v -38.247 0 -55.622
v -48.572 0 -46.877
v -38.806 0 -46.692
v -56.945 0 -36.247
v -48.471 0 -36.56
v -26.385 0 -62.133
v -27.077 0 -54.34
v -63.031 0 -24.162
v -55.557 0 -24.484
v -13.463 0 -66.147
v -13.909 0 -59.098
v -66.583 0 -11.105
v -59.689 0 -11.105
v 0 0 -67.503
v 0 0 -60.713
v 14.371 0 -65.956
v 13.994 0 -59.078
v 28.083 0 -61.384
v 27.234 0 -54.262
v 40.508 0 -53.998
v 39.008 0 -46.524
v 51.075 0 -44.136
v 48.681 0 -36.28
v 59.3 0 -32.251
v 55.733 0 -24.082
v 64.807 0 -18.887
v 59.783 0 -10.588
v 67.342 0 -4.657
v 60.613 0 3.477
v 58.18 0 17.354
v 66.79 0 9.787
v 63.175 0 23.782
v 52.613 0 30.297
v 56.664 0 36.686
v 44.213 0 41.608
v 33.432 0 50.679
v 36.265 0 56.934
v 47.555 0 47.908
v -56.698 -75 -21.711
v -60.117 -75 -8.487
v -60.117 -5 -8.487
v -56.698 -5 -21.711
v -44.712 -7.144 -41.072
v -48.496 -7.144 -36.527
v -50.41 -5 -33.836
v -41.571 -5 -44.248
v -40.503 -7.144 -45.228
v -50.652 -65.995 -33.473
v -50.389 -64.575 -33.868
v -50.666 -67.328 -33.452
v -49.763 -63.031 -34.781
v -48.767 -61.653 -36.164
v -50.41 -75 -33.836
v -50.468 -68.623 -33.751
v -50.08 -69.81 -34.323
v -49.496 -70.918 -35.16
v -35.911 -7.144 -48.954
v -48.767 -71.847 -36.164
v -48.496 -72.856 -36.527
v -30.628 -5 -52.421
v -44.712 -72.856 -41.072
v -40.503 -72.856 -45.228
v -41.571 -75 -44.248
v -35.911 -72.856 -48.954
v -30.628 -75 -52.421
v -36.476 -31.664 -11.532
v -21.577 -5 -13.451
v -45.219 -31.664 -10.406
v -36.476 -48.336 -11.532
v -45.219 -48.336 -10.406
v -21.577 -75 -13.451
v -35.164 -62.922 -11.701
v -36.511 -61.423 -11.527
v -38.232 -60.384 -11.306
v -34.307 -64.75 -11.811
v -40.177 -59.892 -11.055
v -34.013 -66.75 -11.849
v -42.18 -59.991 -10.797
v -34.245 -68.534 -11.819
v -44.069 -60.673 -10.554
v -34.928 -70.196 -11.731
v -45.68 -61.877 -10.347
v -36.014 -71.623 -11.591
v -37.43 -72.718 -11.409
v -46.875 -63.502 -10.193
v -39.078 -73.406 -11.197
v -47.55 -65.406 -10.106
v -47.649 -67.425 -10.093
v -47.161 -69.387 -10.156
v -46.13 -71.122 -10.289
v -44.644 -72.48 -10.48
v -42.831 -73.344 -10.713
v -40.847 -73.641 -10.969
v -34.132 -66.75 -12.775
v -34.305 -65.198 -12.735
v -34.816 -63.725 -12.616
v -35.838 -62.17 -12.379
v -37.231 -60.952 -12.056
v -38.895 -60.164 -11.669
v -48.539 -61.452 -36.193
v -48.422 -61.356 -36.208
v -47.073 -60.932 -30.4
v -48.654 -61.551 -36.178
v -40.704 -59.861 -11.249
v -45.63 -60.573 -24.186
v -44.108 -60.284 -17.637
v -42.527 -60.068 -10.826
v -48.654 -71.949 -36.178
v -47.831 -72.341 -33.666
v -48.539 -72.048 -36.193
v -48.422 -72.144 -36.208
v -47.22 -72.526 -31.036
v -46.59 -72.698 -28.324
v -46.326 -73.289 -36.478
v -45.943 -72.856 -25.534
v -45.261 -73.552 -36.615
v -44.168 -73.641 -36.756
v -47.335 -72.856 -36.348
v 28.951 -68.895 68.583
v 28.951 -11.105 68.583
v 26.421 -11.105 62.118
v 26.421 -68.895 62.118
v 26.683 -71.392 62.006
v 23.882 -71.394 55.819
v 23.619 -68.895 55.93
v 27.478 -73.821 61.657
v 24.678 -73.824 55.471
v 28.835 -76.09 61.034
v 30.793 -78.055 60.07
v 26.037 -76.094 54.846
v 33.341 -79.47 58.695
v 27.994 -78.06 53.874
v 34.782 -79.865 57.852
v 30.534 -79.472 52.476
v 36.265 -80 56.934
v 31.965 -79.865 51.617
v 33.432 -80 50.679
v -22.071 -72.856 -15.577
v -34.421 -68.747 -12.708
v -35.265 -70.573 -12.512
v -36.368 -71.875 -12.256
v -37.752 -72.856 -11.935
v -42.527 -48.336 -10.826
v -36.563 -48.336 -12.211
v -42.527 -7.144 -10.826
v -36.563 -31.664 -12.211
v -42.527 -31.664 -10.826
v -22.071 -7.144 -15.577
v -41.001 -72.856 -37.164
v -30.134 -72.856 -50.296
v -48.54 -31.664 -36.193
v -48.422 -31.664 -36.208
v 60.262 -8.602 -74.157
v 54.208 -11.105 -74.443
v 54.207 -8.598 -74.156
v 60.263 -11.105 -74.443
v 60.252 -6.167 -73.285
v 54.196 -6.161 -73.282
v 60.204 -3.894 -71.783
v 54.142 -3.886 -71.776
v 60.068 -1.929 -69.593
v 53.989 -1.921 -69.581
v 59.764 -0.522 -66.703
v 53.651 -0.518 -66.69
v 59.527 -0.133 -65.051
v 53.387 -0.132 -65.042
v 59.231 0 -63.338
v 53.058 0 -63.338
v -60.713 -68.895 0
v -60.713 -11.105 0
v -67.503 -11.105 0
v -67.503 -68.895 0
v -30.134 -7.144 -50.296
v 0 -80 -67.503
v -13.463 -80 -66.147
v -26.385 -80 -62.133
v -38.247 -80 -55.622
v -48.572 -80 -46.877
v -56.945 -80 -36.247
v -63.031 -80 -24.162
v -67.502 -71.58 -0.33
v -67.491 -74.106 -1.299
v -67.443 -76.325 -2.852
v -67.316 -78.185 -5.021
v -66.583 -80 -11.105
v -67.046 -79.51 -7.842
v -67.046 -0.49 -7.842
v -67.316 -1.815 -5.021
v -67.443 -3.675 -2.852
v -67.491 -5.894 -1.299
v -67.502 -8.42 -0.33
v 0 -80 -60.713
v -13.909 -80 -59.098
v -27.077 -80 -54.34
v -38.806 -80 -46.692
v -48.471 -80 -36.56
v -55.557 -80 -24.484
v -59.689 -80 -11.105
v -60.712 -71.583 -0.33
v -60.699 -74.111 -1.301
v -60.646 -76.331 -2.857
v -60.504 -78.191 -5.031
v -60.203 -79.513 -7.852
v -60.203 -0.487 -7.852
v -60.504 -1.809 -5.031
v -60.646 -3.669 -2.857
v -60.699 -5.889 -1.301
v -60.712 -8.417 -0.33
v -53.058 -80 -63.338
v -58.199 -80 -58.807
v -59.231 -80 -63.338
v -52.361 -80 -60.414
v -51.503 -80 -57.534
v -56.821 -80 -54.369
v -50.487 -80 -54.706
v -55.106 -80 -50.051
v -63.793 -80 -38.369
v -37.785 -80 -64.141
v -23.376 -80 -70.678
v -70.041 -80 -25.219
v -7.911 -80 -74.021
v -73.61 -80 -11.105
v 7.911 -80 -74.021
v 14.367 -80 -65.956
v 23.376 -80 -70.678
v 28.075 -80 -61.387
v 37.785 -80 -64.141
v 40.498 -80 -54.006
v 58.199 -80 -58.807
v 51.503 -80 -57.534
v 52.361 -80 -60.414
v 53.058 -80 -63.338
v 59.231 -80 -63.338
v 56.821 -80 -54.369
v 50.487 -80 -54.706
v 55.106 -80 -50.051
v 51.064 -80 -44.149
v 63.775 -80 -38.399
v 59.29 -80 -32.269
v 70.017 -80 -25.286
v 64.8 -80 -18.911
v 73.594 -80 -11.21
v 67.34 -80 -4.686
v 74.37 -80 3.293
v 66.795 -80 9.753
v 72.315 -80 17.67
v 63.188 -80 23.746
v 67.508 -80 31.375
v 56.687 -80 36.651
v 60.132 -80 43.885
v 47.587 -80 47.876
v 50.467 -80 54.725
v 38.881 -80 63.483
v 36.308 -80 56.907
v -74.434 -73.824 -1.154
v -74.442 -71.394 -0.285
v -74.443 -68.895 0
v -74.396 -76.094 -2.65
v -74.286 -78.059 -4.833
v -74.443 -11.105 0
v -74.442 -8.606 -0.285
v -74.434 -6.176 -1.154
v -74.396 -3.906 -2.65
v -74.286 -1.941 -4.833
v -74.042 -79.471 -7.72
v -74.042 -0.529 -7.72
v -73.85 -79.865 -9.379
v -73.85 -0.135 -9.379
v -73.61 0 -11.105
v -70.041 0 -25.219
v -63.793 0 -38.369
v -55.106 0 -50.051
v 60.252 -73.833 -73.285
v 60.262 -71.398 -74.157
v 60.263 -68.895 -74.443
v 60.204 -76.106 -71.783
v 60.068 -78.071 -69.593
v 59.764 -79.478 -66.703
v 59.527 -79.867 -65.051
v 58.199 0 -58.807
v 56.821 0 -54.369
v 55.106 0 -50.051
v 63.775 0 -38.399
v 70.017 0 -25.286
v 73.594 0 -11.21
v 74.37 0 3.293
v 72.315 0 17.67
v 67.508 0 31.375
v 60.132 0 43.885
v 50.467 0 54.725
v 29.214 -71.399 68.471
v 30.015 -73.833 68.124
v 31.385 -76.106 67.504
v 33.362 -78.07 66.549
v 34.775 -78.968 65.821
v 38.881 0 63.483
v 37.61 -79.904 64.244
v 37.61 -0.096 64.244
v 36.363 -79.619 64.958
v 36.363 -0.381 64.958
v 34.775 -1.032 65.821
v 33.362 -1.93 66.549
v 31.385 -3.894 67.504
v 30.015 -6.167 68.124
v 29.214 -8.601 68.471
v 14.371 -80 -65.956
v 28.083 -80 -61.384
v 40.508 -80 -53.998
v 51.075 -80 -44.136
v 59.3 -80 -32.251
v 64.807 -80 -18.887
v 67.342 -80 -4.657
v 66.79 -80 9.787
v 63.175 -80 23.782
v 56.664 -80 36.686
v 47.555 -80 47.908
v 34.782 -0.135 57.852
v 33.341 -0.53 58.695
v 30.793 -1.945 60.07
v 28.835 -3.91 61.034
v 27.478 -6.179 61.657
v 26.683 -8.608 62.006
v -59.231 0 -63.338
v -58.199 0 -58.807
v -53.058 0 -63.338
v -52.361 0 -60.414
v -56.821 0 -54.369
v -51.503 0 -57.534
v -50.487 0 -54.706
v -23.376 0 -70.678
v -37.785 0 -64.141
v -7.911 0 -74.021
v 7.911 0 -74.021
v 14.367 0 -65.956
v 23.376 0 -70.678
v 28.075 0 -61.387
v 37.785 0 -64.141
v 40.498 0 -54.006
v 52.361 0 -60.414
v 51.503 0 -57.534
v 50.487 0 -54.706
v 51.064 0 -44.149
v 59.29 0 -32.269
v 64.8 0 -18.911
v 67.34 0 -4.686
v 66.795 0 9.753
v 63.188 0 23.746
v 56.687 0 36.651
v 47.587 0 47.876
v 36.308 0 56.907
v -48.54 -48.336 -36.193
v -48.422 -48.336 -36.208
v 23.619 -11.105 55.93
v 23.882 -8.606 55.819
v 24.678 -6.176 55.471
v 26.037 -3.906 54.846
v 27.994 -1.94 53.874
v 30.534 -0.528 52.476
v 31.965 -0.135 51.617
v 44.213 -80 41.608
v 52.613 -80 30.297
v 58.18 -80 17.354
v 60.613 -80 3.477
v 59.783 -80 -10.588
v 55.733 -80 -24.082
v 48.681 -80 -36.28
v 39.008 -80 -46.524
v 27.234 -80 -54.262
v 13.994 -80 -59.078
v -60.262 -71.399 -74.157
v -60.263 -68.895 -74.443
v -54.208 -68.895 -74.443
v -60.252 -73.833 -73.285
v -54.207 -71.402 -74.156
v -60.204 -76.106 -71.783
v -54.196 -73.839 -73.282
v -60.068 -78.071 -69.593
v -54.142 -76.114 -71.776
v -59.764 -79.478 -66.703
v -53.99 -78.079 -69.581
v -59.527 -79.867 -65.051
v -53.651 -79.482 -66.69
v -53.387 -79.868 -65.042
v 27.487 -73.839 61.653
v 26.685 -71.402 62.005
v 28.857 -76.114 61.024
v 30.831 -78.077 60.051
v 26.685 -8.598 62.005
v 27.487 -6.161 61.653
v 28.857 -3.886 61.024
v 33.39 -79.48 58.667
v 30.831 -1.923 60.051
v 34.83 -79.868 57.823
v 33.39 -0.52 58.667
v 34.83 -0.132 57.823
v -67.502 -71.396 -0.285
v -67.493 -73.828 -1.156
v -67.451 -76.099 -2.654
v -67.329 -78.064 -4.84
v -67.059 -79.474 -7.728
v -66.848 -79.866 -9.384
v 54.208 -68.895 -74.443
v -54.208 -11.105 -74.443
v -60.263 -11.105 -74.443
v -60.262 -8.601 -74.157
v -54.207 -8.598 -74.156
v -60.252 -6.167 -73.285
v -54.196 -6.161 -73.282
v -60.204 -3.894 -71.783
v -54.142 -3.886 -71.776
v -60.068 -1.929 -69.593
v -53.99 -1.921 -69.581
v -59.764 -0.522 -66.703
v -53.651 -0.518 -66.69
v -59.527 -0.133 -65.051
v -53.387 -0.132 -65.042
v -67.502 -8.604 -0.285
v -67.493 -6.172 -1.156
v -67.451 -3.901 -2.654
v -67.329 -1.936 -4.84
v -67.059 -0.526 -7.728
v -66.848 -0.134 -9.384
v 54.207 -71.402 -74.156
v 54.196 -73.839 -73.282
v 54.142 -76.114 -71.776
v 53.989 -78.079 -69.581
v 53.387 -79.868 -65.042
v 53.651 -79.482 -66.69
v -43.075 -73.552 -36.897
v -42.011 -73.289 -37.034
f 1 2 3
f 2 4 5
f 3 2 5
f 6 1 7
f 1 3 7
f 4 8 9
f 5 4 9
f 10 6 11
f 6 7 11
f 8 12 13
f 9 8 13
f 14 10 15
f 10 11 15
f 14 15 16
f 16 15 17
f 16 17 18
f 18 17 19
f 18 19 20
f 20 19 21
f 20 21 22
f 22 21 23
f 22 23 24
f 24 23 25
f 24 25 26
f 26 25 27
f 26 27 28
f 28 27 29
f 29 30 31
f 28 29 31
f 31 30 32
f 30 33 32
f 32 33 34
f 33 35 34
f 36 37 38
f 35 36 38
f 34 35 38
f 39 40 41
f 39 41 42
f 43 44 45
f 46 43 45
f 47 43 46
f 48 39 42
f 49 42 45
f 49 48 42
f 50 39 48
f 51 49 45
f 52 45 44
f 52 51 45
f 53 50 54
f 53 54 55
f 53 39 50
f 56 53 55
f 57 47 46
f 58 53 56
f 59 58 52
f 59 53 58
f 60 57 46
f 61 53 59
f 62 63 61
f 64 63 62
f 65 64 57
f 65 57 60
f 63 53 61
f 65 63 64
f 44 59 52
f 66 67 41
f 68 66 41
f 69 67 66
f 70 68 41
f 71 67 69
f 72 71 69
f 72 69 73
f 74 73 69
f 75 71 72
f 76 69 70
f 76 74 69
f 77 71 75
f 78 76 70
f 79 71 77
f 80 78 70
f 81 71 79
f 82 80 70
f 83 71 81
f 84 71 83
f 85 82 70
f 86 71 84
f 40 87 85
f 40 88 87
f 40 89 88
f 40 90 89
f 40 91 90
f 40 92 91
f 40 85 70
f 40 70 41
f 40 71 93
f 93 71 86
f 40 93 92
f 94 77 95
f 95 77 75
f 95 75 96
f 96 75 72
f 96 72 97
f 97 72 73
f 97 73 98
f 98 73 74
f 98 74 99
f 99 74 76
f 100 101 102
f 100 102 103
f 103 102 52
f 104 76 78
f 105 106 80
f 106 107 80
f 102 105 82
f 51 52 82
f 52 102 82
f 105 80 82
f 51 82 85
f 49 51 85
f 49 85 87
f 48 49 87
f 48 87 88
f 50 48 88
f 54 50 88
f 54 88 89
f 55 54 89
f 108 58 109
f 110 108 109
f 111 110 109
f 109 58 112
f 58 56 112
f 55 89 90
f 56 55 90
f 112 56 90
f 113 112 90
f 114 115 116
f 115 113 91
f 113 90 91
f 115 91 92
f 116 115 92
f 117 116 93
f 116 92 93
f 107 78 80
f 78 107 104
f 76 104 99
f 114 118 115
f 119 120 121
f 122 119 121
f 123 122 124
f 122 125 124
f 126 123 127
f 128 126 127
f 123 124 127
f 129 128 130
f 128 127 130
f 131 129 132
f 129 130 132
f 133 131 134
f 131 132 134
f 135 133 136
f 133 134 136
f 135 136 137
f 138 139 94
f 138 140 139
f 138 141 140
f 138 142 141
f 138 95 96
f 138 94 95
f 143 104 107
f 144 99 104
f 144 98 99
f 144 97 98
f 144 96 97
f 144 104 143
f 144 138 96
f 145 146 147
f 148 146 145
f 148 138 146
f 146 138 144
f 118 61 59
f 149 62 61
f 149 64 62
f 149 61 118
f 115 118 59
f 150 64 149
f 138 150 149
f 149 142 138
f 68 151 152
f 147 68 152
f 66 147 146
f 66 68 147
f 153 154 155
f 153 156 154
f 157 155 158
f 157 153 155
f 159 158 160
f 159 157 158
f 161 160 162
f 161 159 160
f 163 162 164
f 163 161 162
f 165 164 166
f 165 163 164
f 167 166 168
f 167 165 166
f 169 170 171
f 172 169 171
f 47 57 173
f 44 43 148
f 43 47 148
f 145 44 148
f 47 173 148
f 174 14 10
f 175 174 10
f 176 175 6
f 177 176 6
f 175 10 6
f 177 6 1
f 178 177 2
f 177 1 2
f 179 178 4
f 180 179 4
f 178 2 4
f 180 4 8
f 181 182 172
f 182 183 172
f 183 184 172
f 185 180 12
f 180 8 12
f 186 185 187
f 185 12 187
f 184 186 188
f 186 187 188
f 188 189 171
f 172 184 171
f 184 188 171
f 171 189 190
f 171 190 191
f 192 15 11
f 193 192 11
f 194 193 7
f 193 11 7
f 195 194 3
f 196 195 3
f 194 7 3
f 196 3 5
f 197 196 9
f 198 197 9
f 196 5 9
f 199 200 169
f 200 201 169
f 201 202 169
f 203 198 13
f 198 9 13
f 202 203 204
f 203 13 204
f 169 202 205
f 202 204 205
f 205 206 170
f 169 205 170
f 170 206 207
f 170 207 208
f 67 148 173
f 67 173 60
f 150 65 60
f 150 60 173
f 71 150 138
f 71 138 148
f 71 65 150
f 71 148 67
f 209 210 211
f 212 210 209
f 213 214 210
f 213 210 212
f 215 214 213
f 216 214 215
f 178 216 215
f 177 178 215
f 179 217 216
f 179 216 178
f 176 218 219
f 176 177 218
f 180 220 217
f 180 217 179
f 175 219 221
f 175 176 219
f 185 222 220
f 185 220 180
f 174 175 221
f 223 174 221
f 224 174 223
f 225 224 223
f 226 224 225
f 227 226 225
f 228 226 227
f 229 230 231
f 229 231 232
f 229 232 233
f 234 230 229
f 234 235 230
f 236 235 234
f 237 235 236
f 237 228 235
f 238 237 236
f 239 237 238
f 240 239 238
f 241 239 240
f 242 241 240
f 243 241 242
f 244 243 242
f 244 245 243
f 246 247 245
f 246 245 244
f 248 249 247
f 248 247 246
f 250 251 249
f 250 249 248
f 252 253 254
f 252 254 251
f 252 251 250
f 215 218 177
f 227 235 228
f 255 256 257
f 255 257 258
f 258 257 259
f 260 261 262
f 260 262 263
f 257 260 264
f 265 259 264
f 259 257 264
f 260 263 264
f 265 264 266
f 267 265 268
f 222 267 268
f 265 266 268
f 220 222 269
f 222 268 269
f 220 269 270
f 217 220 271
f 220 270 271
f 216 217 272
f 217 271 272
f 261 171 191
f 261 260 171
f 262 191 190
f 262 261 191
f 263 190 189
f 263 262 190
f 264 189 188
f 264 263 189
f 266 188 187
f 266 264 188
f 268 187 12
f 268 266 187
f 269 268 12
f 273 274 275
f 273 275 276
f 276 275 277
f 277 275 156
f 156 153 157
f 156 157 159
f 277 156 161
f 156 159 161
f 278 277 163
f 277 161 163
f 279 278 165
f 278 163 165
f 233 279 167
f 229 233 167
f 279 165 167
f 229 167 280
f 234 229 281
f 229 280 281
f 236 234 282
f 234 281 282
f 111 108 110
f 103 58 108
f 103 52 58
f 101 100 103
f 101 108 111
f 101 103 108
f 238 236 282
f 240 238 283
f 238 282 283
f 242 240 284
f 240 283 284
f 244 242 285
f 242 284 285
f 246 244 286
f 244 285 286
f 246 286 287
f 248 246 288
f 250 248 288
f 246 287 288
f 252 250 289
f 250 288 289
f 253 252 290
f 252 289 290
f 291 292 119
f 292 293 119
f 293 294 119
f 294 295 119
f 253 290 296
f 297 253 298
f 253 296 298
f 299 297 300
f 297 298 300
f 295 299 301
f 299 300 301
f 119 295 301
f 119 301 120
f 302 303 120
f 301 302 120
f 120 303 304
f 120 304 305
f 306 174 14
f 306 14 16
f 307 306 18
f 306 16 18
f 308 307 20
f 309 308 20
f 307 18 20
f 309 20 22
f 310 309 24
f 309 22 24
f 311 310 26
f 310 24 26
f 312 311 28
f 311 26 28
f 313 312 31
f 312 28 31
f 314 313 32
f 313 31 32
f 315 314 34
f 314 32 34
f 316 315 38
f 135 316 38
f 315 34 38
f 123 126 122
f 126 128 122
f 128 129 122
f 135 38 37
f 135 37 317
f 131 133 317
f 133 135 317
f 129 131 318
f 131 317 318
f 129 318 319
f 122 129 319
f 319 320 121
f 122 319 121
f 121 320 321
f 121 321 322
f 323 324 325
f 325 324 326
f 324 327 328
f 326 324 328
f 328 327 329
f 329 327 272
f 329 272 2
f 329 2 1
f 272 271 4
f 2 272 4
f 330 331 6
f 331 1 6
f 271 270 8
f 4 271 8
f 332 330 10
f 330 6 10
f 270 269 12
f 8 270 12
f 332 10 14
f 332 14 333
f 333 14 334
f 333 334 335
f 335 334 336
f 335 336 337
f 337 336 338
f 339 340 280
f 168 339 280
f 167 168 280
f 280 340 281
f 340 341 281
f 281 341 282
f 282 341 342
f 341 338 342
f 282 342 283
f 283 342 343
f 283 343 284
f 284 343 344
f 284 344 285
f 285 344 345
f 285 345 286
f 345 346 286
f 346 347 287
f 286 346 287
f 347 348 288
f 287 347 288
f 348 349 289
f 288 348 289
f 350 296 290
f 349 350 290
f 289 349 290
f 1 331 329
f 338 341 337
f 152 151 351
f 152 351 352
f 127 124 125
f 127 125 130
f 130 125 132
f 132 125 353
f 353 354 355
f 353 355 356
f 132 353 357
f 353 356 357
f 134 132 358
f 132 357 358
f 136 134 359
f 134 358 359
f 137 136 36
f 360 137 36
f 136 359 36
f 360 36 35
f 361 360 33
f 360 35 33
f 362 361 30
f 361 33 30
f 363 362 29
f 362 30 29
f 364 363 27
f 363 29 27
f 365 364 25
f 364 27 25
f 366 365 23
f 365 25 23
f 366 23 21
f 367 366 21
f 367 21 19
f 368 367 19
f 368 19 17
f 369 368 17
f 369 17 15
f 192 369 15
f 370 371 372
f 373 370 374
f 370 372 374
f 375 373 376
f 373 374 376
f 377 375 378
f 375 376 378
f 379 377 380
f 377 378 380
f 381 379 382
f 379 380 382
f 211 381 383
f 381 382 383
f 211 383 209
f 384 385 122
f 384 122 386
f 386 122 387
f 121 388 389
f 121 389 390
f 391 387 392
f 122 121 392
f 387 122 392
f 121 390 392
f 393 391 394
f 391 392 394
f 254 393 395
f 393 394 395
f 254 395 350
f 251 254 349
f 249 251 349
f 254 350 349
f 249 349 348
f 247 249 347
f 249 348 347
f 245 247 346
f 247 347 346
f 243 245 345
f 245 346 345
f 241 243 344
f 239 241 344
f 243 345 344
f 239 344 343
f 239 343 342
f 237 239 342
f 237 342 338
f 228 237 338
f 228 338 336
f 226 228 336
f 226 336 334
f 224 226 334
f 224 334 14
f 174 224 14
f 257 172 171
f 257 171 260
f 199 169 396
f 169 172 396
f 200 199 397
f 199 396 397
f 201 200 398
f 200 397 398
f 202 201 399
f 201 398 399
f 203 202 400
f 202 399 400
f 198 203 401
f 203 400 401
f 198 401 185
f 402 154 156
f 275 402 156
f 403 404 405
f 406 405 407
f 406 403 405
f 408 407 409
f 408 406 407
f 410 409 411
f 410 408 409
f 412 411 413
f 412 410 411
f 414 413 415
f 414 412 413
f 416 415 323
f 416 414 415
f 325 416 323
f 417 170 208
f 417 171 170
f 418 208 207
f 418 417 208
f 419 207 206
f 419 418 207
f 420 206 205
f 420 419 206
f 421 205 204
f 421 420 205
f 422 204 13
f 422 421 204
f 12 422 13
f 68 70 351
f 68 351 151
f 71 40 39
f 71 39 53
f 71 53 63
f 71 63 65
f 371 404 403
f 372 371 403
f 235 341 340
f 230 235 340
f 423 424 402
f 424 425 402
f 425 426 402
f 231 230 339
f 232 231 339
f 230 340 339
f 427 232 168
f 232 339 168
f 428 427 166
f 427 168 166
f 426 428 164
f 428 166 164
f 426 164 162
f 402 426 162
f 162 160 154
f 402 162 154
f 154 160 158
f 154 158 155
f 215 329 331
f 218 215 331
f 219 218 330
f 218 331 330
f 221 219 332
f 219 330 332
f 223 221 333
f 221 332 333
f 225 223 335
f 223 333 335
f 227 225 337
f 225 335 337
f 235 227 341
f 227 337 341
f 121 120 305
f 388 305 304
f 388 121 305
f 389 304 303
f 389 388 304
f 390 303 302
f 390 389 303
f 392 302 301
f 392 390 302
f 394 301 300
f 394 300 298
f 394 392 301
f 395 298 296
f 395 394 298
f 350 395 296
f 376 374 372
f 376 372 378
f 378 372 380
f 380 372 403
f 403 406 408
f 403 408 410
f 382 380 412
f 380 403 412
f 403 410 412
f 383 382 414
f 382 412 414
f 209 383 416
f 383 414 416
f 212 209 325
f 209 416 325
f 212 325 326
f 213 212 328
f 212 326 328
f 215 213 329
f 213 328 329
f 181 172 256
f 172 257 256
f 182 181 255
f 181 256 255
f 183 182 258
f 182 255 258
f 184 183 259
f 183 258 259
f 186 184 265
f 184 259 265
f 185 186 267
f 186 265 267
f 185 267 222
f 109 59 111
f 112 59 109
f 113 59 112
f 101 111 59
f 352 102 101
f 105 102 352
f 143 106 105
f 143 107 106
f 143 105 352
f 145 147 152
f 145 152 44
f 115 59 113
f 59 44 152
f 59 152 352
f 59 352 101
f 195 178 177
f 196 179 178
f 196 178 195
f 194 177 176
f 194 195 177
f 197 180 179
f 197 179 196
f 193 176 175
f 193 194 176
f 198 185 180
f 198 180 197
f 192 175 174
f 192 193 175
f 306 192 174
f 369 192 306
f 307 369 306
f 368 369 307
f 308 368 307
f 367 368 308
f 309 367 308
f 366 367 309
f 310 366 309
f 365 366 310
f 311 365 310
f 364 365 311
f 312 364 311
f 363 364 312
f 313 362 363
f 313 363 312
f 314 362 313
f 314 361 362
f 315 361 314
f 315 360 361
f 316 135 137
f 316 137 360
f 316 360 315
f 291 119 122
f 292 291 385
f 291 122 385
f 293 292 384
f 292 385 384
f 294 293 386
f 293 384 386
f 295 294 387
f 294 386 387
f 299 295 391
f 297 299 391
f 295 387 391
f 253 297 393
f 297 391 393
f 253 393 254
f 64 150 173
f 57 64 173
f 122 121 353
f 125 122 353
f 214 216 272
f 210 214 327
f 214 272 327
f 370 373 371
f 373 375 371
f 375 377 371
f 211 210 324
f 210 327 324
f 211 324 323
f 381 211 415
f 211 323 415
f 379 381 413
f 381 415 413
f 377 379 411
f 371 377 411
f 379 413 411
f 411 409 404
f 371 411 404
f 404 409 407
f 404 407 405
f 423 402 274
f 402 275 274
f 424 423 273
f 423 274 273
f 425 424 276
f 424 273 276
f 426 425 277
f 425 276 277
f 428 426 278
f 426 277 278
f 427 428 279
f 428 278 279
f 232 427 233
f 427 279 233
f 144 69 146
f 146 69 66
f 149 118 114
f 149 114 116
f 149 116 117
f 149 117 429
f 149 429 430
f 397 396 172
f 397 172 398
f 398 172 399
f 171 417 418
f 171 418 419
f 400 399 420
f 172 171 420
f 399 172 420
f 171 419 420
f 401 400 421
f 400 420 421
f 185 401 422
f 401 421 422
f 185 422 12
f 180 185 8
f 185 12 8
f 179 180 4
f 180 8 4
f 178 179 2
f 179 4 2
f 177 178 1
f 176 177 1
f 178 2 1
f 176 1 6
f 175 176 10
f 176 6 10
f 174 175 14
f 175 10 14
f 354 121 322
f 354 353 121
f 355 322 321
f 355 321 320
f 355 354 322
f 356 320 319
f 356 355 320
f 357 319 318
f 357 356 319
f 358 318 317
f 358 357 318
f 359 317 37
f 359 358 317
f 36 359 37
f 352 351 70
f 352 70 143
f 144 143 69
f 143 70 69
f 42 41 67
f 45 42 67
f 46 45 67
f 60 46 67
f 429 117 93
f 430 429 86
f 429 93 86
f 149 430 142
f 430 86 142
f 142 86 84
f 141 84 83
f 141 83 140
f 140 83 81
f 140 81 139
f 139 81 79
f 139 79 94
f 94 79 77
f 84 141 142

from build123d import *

# Parameters (mm, degrees)
F1_DEPTH      = 80
F2_DEPTH      = 80
F3_R          = 11.1053823869
F3_2_R        = 11.1053823869
F6_DEPTH      = 35
F6_DEPTH_BACK = 35
F8_DEPTH      = 26
F7_W          = 8.815
F7_H          = 16.672
F9_DEPTH      = 26
F10_W         = 65.713
F10_H         = 35.643
F11_DEPTH     = 21


with BuildPart() as f1:
    # F0 (on Front) → F1 (new body)
    with BuildSketch(Plane.XZ):
        with BuildLine():
            Line((0, -67.503), (0, -60.713))
            ThreePointArc((0, -60.713), (-42.9305740062, -42.9305740062), (-60.713, 0))
            Line((-60.713, 0), (-67.503, 0))
            ThreePointArc((-67.503, 0), (-47.7318290504, -47.7318290504), (0, -67.503))
        make_face()
        with BuildLine():
            Line((26.4210219705, 62.1175064457), (23.6194665166, 55.9302169714))
            ThreePointArc((23.6194665166, 55.9302169714), (59.505292336, -12.0494212727), (0, -60.713))
            Line((0, -60.713), (0, -67.503))
            ThreePointArc((0, -67.503), (66.1429249678, -13.4821543419), (26.4210219705, 62.1175064457))
        make_face()
    extrude(amount=F1_DEPTH)

    # F3
    f3_edges = [f1.edges().sort_by_distance(p)[0] for p in [
        (-64.108, -80, 0),
        (-64.108, 0, 0),
        (25.020244, -80, 59.023862),
        (25.020244, 0, 59.023862),
    ]]
    fillet(f3_edges, radius=F3_R)


with BuildPart() as f2:
    # F0 (on Front) → F2 (new body)
    with BuildSketch(Plane.XZ):
        with BuildLine():
            Line((0, -74.443), (0, -67.503))
            ThreePointArc((0, -67.503), (-47.7318290504, -47.7318290504), (-67.503, 0))
            Line((-67.503, 0), (-74.443, 0))
            ThreePointArc((-74.443, 0), (-69.4406504587, -26.8282745041), (-55.1058880387, -50.0509875274))
            ThreePointArc((-55.1058880387, -50.0509875274), (-52.8479074613, -52.4295615656), (-50.4873535385, -54.7063742326))
            ThreePointArc((-50.4873535385, -54.7063742326), (-27.104, -69.3334943083), (0, -74.443))
        make_face()
        with BuildLine():
            Line((28.9509467911, 68.5828180297), (26.4210219705, 62.1175064457))
            ThreePointArc((26.4210219705, 62.1175064457), (66.1429249678, -13.4821543419), (0, -67.503))
            Line((0, -67.503), (0, -74.443))
            ThreePointArc((0, -74.443), (27.104, -69.3334943083), (50.4873535385, -54.7063742326))
            ThreePointArc((50.4873535385, -54.7063742326), (52.8479074613, -52.4295615656), (55.1058880387, -50.0509875274))
            ThreePointArc((55.1058880387, -50.0509875274), (72.6971995722, 16.0273960255), (28.9509467911, 68.5828180297))
        make_face()
        with BuildLine():
            ThreePointArc((-54.208, -74.443), (-53.2697180611, -64.4008686678), (-50.4873535385, -54.7063742326))
            ThreePointArc((-50.4873535385, -54.7063742326), (-52.8479074613, -52.4295615656), (-55.1058880387, -50.0509875274))
            ThreePointArc((-55.1058880387, -50.0509875274), (-58.959627288, -61.9773865349), (-60.263, -74.443))
            Line((-60.263, -74.443), (-54.208, -74.443))
        make_face()
        with BuildLine():
            ThreePointArc((60.263, -74.443), (58.959627288, -61.9773865349), (55.1058880387, -50.0509875274))
            ThreePointArc((55.1058880387, -50.0509875274), (52.8479074613, -52.4295615656), (50.4873535385, -54.7063742326))
            ThreePointArc((50.4873535385, -54.7063742326), (53.2697180611, -64.4008686678), (54.208, -74.443))
            Line((54.208, -74.443), (60.263, -74.443))
        make_face()
    extrude(amount=F2_DEPTH)

    # F3#2
    f3_2_edges = [f2.edges().sort_by_distance(p)[0] for p in [
        (-70.973, -80, 0),
        (-70.973, 0, 0),
        (27.685984, -80, 65.350162),
        (27.685984, 0, 65.350162),
        (-57.2355, -80, -74.443),
        (-57.2355, 0, -74.443),
        (57.2355, -80, -74.443),
        (57.2355, 0, -74.443),
    ]]
    fillet(f3_2_edges, radius=F3_2_R)


with BuildPart() as f6:
    # F5 (on offset) → F6 (new body, two sides)
    with BuildSketch(Plane.XZ.offset(40)) as f6_sk:
        with BuildLine():
            Line((-21.5773568214, -13.4508206014), (-60.1168669908, -8.4870885591))
            ThreePointArc((-60.1168669908, -8.4870885591), (-50.4104761962, -33.8356654829), (-30.6281347583, -52.4212335817))
            Line((-30.6281347583, -52.4212335817), (-21.5773568214, -13.4508206014))
        make_face()
    extrude(amount=F6_DEPTH)
    extrude(f6_sk.sketch, amount=-F6_DEPTH_BACK)

    # F7 (on face) → F8 (cut)
    with BuildSketch(Plane(origin=(-2.0562349566, 0, -15.9650616406), x_dir=(0.9918075887, 0, -0.1277407805), z_dir=(0.1277407805, 0, 0.9918075887))):
        with BuildLine():
            ThreePointArc((-32.2202927461, -66.75), (-43.9839655752, -61.8773271708), (-39.1112927461, -73.641))
            ThreePointArc((-39.1112927461, -73.641), (-34.2386199169, -71.6226728292), (-32.2202927461, -66.75))
        make_face()
    extrude(amount=-F8_DEPTH, mode=Mode.SUBTRACT)

    # F7 (on face) → F9 (cut)
    with BuildSketch(Plane(origin=(-2.0562349566, 0, -15.9650616406), x_dir=(0.9918075887, 0, -0.1277407805), z_dir=(0.1277407805, 0, 0.9918075887))):
        with Locations((-39.1112927461, -40)):
            Rectangle(F7_W, F7_H)
    extrude(amount=-F9_DEPTH, mode=Mode.SUBTRACT)

    # F10 (on face) → F11 (cut)
    with BuildSketch(Plane(origin=(-17.5090216634, 0, 4.0664251377), x_dir=(0, 1, 0), z_dir=(0.9740747599, 0, -0.2262263515))):
        with Locations((-40, -37.987281626)):
            Rectangle(F10_W, F10_H)
    extrude(amount=-F11_DEPTH, mode=Mode.SUBTRACT)


solid = Compound([f1.part, f2.part, f6.part])
